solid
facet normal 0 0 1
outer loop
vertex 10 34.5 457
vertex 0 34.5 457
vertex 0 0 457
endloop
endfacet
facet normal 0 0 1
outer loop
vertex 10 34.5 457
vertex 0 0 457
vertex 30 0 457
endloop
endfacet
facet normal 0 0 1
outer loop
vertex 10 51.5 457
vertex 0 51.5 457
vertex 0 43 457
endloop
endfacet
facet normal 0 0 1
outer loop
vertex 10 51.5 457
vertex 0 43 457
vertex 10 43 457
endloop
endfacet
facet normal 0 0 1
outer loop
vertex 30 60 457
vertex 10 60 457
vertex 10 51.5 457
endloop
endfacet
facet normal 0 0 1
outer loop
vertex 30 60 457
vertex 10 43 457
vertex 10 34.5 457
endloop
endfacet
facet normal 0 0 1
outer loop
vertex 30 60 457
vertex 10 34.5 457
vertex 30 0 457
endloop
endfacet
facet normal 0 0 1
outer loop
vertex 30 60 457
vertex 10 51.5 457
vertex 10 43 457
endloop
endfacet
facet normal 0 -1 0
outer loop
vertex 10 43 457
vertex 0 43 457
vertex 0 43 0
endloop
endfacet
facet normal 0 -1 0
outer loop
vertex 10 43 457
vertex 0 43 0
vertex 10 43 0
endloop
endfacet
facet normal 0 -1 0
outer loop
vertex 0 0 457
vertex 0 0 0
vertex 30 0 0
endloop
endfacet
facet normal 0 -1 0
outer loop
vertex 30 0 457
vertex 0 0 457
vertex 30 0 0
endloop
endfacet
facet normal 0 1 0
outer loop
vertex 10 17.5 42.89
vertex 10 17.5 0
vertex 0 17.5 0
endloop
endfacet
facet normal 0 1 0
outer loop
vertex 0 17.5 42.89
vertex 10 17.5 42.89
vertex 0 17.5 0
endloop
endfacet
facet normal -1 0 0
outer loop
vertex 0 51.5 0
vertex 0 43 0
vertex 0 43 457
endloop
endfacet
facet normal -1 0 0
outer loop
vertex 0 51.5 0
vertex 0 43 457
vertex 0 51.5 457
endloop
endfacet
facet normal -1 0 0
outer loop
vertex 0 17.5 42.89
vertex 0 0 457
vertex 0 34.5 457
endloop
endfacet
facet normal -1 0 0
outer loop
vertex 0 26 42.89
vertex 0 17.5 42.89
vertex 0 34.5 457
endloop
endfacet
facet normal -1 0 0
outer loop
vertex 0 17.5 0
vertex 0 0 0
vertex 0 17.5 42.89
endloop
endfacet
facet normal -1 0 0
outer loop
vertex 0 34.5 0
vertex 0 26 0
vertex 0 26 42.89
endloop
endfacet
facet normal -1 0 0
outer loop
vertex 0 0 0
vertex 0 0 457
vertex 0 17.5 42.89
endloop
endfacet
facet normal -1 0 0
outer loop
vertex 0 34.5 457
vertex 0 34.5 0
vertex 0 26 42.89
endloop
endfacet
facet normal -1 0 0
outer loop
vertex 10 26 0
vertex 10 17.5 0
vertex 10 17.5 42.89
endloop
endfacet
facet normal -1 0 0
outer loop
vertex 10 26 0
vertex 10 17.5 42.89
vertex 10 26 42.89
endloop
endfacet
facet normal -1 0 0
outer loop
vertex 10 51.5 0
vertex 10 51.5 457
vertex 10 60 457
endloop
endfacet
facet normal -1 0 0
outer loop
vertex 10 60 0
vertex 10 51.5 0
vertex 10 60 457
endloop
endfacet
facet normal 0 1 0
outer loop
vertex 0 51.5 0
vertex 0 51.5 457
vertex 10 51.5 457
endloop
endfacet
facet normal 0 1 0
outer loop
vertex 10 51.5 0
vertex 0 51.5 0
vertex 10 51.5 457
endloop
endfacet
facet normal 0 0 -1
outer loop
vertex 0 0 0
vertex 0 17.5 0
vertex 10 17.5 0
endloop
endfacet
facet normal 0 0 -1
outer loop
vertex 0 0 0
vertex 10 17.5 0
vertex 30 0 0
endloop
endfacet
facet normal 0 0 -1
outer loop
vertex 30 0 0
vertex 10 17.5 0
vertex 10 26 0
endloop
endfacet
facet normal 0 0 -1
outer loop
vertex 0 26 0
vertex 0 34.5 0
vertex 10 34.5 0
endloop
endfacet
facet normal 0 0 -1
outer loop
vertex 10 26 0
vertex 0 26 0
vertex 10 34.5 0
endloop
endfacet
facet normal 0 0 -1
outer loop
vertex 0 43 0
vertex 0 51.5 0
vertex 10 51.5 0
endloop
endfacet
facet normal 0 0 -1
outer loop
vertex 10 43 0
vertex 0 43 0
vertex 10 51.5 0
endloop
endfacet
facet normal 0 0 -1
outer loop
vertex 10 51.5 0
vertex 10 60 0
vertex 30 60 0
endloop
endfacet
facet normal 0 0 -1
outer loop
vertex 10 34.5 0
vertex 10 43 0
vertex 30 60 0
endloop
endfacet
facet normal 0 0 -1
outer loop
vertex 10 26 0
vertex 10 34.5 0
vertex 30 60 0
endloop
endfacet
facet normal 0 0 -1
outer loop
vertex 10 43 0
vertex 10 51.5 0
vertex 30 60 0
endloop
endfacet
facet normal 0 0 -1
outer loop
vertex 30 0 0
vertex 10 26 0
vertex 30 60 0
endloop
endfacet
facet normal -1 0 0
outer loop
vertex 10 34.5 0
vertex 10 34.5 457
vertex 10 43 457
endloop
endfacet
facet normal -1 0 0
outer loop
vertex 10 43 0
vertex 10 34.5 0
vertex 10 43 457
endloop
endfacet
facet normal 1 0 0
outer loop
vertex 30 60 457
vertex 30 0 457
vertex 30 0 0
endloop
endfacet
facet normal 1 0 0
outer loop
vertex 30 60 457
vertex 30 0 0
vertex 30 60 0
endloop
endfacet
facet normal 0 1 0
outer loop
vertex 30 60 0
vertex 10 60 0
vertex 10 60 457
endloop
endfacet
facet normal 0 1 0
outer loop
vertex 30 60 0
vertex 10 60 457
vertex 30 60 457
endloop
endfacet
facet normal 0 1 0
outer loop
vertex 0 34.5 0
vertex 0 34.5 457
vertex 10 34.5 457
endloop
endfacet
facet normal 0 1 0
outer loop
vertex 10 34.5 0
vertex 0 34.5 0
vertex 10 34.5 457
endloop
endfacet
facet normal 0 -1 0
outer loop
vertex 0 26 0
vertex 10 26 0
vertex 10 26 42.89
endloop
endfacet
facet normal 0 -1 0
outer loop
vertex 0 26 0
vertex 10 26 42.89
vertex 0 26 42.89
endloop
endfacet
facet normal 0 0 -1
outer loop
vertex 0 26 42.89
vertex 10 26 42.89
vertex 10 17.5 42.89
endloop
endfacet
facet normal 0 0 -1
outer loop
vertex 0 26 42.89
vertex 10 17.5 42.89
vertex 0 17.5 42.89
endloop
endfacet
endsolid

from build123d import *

# Parameters (mm, degrees)
SKETCH1_W           = 30
SKETCH1_H           = 60
BOSS_EXTRUDE1_DEPTH = 457
SKETCH2_W           = 10
SKETCH2_H           = 8.5
CUT_EXTRUDE1_DEPTH  = 500
SKETCH3_W           = 10
SKETCH3_H           = 8.5
CUT_EXTRUDE2_DEPTH  = 42.89


with BuildPart() as part:
    # Sketch1 → Boss-Extrude1 (new body)
    with BuildSketch(Plane.XY):
        with Locations((15, 30)):
            Rectangle(SKETCH1_W, SKETCH1_H)
    extrude(amount=BOSS_EXTRUDE1_DEPTH)

    # Sketch2 → Cut-Extrude1 (cut)
    with BuildSketch(Plane.XY.offset(457)):
        with Locations((5, 38.75)):
            Rectangle(SKETCH2_W, SKETCH2_H)
        with Locations((5, 55.75)):
            Rectangle(SKETCH2_W, SKETCH2_H)
    extrude(amount=-CUT_EXTRUDE1_DEPTH, mode=Mode.SUBTRACT)

    # Sketch3 → Cut-Extrude2 (cut)
    with BuildSketch(Plane(origin=(0, 0, 0), x_dir=(-1, 0, 0), z_dir=(0, 0, -1))):
        with Locations((-5, 21.75)):
            Rectangle(SKETCH3_W, SKETCH3_H)
    extrude(amount=-CUT_EXTRUDE2_DEPTH, mode=Mode.SUBTRACT)


solid = part.part
